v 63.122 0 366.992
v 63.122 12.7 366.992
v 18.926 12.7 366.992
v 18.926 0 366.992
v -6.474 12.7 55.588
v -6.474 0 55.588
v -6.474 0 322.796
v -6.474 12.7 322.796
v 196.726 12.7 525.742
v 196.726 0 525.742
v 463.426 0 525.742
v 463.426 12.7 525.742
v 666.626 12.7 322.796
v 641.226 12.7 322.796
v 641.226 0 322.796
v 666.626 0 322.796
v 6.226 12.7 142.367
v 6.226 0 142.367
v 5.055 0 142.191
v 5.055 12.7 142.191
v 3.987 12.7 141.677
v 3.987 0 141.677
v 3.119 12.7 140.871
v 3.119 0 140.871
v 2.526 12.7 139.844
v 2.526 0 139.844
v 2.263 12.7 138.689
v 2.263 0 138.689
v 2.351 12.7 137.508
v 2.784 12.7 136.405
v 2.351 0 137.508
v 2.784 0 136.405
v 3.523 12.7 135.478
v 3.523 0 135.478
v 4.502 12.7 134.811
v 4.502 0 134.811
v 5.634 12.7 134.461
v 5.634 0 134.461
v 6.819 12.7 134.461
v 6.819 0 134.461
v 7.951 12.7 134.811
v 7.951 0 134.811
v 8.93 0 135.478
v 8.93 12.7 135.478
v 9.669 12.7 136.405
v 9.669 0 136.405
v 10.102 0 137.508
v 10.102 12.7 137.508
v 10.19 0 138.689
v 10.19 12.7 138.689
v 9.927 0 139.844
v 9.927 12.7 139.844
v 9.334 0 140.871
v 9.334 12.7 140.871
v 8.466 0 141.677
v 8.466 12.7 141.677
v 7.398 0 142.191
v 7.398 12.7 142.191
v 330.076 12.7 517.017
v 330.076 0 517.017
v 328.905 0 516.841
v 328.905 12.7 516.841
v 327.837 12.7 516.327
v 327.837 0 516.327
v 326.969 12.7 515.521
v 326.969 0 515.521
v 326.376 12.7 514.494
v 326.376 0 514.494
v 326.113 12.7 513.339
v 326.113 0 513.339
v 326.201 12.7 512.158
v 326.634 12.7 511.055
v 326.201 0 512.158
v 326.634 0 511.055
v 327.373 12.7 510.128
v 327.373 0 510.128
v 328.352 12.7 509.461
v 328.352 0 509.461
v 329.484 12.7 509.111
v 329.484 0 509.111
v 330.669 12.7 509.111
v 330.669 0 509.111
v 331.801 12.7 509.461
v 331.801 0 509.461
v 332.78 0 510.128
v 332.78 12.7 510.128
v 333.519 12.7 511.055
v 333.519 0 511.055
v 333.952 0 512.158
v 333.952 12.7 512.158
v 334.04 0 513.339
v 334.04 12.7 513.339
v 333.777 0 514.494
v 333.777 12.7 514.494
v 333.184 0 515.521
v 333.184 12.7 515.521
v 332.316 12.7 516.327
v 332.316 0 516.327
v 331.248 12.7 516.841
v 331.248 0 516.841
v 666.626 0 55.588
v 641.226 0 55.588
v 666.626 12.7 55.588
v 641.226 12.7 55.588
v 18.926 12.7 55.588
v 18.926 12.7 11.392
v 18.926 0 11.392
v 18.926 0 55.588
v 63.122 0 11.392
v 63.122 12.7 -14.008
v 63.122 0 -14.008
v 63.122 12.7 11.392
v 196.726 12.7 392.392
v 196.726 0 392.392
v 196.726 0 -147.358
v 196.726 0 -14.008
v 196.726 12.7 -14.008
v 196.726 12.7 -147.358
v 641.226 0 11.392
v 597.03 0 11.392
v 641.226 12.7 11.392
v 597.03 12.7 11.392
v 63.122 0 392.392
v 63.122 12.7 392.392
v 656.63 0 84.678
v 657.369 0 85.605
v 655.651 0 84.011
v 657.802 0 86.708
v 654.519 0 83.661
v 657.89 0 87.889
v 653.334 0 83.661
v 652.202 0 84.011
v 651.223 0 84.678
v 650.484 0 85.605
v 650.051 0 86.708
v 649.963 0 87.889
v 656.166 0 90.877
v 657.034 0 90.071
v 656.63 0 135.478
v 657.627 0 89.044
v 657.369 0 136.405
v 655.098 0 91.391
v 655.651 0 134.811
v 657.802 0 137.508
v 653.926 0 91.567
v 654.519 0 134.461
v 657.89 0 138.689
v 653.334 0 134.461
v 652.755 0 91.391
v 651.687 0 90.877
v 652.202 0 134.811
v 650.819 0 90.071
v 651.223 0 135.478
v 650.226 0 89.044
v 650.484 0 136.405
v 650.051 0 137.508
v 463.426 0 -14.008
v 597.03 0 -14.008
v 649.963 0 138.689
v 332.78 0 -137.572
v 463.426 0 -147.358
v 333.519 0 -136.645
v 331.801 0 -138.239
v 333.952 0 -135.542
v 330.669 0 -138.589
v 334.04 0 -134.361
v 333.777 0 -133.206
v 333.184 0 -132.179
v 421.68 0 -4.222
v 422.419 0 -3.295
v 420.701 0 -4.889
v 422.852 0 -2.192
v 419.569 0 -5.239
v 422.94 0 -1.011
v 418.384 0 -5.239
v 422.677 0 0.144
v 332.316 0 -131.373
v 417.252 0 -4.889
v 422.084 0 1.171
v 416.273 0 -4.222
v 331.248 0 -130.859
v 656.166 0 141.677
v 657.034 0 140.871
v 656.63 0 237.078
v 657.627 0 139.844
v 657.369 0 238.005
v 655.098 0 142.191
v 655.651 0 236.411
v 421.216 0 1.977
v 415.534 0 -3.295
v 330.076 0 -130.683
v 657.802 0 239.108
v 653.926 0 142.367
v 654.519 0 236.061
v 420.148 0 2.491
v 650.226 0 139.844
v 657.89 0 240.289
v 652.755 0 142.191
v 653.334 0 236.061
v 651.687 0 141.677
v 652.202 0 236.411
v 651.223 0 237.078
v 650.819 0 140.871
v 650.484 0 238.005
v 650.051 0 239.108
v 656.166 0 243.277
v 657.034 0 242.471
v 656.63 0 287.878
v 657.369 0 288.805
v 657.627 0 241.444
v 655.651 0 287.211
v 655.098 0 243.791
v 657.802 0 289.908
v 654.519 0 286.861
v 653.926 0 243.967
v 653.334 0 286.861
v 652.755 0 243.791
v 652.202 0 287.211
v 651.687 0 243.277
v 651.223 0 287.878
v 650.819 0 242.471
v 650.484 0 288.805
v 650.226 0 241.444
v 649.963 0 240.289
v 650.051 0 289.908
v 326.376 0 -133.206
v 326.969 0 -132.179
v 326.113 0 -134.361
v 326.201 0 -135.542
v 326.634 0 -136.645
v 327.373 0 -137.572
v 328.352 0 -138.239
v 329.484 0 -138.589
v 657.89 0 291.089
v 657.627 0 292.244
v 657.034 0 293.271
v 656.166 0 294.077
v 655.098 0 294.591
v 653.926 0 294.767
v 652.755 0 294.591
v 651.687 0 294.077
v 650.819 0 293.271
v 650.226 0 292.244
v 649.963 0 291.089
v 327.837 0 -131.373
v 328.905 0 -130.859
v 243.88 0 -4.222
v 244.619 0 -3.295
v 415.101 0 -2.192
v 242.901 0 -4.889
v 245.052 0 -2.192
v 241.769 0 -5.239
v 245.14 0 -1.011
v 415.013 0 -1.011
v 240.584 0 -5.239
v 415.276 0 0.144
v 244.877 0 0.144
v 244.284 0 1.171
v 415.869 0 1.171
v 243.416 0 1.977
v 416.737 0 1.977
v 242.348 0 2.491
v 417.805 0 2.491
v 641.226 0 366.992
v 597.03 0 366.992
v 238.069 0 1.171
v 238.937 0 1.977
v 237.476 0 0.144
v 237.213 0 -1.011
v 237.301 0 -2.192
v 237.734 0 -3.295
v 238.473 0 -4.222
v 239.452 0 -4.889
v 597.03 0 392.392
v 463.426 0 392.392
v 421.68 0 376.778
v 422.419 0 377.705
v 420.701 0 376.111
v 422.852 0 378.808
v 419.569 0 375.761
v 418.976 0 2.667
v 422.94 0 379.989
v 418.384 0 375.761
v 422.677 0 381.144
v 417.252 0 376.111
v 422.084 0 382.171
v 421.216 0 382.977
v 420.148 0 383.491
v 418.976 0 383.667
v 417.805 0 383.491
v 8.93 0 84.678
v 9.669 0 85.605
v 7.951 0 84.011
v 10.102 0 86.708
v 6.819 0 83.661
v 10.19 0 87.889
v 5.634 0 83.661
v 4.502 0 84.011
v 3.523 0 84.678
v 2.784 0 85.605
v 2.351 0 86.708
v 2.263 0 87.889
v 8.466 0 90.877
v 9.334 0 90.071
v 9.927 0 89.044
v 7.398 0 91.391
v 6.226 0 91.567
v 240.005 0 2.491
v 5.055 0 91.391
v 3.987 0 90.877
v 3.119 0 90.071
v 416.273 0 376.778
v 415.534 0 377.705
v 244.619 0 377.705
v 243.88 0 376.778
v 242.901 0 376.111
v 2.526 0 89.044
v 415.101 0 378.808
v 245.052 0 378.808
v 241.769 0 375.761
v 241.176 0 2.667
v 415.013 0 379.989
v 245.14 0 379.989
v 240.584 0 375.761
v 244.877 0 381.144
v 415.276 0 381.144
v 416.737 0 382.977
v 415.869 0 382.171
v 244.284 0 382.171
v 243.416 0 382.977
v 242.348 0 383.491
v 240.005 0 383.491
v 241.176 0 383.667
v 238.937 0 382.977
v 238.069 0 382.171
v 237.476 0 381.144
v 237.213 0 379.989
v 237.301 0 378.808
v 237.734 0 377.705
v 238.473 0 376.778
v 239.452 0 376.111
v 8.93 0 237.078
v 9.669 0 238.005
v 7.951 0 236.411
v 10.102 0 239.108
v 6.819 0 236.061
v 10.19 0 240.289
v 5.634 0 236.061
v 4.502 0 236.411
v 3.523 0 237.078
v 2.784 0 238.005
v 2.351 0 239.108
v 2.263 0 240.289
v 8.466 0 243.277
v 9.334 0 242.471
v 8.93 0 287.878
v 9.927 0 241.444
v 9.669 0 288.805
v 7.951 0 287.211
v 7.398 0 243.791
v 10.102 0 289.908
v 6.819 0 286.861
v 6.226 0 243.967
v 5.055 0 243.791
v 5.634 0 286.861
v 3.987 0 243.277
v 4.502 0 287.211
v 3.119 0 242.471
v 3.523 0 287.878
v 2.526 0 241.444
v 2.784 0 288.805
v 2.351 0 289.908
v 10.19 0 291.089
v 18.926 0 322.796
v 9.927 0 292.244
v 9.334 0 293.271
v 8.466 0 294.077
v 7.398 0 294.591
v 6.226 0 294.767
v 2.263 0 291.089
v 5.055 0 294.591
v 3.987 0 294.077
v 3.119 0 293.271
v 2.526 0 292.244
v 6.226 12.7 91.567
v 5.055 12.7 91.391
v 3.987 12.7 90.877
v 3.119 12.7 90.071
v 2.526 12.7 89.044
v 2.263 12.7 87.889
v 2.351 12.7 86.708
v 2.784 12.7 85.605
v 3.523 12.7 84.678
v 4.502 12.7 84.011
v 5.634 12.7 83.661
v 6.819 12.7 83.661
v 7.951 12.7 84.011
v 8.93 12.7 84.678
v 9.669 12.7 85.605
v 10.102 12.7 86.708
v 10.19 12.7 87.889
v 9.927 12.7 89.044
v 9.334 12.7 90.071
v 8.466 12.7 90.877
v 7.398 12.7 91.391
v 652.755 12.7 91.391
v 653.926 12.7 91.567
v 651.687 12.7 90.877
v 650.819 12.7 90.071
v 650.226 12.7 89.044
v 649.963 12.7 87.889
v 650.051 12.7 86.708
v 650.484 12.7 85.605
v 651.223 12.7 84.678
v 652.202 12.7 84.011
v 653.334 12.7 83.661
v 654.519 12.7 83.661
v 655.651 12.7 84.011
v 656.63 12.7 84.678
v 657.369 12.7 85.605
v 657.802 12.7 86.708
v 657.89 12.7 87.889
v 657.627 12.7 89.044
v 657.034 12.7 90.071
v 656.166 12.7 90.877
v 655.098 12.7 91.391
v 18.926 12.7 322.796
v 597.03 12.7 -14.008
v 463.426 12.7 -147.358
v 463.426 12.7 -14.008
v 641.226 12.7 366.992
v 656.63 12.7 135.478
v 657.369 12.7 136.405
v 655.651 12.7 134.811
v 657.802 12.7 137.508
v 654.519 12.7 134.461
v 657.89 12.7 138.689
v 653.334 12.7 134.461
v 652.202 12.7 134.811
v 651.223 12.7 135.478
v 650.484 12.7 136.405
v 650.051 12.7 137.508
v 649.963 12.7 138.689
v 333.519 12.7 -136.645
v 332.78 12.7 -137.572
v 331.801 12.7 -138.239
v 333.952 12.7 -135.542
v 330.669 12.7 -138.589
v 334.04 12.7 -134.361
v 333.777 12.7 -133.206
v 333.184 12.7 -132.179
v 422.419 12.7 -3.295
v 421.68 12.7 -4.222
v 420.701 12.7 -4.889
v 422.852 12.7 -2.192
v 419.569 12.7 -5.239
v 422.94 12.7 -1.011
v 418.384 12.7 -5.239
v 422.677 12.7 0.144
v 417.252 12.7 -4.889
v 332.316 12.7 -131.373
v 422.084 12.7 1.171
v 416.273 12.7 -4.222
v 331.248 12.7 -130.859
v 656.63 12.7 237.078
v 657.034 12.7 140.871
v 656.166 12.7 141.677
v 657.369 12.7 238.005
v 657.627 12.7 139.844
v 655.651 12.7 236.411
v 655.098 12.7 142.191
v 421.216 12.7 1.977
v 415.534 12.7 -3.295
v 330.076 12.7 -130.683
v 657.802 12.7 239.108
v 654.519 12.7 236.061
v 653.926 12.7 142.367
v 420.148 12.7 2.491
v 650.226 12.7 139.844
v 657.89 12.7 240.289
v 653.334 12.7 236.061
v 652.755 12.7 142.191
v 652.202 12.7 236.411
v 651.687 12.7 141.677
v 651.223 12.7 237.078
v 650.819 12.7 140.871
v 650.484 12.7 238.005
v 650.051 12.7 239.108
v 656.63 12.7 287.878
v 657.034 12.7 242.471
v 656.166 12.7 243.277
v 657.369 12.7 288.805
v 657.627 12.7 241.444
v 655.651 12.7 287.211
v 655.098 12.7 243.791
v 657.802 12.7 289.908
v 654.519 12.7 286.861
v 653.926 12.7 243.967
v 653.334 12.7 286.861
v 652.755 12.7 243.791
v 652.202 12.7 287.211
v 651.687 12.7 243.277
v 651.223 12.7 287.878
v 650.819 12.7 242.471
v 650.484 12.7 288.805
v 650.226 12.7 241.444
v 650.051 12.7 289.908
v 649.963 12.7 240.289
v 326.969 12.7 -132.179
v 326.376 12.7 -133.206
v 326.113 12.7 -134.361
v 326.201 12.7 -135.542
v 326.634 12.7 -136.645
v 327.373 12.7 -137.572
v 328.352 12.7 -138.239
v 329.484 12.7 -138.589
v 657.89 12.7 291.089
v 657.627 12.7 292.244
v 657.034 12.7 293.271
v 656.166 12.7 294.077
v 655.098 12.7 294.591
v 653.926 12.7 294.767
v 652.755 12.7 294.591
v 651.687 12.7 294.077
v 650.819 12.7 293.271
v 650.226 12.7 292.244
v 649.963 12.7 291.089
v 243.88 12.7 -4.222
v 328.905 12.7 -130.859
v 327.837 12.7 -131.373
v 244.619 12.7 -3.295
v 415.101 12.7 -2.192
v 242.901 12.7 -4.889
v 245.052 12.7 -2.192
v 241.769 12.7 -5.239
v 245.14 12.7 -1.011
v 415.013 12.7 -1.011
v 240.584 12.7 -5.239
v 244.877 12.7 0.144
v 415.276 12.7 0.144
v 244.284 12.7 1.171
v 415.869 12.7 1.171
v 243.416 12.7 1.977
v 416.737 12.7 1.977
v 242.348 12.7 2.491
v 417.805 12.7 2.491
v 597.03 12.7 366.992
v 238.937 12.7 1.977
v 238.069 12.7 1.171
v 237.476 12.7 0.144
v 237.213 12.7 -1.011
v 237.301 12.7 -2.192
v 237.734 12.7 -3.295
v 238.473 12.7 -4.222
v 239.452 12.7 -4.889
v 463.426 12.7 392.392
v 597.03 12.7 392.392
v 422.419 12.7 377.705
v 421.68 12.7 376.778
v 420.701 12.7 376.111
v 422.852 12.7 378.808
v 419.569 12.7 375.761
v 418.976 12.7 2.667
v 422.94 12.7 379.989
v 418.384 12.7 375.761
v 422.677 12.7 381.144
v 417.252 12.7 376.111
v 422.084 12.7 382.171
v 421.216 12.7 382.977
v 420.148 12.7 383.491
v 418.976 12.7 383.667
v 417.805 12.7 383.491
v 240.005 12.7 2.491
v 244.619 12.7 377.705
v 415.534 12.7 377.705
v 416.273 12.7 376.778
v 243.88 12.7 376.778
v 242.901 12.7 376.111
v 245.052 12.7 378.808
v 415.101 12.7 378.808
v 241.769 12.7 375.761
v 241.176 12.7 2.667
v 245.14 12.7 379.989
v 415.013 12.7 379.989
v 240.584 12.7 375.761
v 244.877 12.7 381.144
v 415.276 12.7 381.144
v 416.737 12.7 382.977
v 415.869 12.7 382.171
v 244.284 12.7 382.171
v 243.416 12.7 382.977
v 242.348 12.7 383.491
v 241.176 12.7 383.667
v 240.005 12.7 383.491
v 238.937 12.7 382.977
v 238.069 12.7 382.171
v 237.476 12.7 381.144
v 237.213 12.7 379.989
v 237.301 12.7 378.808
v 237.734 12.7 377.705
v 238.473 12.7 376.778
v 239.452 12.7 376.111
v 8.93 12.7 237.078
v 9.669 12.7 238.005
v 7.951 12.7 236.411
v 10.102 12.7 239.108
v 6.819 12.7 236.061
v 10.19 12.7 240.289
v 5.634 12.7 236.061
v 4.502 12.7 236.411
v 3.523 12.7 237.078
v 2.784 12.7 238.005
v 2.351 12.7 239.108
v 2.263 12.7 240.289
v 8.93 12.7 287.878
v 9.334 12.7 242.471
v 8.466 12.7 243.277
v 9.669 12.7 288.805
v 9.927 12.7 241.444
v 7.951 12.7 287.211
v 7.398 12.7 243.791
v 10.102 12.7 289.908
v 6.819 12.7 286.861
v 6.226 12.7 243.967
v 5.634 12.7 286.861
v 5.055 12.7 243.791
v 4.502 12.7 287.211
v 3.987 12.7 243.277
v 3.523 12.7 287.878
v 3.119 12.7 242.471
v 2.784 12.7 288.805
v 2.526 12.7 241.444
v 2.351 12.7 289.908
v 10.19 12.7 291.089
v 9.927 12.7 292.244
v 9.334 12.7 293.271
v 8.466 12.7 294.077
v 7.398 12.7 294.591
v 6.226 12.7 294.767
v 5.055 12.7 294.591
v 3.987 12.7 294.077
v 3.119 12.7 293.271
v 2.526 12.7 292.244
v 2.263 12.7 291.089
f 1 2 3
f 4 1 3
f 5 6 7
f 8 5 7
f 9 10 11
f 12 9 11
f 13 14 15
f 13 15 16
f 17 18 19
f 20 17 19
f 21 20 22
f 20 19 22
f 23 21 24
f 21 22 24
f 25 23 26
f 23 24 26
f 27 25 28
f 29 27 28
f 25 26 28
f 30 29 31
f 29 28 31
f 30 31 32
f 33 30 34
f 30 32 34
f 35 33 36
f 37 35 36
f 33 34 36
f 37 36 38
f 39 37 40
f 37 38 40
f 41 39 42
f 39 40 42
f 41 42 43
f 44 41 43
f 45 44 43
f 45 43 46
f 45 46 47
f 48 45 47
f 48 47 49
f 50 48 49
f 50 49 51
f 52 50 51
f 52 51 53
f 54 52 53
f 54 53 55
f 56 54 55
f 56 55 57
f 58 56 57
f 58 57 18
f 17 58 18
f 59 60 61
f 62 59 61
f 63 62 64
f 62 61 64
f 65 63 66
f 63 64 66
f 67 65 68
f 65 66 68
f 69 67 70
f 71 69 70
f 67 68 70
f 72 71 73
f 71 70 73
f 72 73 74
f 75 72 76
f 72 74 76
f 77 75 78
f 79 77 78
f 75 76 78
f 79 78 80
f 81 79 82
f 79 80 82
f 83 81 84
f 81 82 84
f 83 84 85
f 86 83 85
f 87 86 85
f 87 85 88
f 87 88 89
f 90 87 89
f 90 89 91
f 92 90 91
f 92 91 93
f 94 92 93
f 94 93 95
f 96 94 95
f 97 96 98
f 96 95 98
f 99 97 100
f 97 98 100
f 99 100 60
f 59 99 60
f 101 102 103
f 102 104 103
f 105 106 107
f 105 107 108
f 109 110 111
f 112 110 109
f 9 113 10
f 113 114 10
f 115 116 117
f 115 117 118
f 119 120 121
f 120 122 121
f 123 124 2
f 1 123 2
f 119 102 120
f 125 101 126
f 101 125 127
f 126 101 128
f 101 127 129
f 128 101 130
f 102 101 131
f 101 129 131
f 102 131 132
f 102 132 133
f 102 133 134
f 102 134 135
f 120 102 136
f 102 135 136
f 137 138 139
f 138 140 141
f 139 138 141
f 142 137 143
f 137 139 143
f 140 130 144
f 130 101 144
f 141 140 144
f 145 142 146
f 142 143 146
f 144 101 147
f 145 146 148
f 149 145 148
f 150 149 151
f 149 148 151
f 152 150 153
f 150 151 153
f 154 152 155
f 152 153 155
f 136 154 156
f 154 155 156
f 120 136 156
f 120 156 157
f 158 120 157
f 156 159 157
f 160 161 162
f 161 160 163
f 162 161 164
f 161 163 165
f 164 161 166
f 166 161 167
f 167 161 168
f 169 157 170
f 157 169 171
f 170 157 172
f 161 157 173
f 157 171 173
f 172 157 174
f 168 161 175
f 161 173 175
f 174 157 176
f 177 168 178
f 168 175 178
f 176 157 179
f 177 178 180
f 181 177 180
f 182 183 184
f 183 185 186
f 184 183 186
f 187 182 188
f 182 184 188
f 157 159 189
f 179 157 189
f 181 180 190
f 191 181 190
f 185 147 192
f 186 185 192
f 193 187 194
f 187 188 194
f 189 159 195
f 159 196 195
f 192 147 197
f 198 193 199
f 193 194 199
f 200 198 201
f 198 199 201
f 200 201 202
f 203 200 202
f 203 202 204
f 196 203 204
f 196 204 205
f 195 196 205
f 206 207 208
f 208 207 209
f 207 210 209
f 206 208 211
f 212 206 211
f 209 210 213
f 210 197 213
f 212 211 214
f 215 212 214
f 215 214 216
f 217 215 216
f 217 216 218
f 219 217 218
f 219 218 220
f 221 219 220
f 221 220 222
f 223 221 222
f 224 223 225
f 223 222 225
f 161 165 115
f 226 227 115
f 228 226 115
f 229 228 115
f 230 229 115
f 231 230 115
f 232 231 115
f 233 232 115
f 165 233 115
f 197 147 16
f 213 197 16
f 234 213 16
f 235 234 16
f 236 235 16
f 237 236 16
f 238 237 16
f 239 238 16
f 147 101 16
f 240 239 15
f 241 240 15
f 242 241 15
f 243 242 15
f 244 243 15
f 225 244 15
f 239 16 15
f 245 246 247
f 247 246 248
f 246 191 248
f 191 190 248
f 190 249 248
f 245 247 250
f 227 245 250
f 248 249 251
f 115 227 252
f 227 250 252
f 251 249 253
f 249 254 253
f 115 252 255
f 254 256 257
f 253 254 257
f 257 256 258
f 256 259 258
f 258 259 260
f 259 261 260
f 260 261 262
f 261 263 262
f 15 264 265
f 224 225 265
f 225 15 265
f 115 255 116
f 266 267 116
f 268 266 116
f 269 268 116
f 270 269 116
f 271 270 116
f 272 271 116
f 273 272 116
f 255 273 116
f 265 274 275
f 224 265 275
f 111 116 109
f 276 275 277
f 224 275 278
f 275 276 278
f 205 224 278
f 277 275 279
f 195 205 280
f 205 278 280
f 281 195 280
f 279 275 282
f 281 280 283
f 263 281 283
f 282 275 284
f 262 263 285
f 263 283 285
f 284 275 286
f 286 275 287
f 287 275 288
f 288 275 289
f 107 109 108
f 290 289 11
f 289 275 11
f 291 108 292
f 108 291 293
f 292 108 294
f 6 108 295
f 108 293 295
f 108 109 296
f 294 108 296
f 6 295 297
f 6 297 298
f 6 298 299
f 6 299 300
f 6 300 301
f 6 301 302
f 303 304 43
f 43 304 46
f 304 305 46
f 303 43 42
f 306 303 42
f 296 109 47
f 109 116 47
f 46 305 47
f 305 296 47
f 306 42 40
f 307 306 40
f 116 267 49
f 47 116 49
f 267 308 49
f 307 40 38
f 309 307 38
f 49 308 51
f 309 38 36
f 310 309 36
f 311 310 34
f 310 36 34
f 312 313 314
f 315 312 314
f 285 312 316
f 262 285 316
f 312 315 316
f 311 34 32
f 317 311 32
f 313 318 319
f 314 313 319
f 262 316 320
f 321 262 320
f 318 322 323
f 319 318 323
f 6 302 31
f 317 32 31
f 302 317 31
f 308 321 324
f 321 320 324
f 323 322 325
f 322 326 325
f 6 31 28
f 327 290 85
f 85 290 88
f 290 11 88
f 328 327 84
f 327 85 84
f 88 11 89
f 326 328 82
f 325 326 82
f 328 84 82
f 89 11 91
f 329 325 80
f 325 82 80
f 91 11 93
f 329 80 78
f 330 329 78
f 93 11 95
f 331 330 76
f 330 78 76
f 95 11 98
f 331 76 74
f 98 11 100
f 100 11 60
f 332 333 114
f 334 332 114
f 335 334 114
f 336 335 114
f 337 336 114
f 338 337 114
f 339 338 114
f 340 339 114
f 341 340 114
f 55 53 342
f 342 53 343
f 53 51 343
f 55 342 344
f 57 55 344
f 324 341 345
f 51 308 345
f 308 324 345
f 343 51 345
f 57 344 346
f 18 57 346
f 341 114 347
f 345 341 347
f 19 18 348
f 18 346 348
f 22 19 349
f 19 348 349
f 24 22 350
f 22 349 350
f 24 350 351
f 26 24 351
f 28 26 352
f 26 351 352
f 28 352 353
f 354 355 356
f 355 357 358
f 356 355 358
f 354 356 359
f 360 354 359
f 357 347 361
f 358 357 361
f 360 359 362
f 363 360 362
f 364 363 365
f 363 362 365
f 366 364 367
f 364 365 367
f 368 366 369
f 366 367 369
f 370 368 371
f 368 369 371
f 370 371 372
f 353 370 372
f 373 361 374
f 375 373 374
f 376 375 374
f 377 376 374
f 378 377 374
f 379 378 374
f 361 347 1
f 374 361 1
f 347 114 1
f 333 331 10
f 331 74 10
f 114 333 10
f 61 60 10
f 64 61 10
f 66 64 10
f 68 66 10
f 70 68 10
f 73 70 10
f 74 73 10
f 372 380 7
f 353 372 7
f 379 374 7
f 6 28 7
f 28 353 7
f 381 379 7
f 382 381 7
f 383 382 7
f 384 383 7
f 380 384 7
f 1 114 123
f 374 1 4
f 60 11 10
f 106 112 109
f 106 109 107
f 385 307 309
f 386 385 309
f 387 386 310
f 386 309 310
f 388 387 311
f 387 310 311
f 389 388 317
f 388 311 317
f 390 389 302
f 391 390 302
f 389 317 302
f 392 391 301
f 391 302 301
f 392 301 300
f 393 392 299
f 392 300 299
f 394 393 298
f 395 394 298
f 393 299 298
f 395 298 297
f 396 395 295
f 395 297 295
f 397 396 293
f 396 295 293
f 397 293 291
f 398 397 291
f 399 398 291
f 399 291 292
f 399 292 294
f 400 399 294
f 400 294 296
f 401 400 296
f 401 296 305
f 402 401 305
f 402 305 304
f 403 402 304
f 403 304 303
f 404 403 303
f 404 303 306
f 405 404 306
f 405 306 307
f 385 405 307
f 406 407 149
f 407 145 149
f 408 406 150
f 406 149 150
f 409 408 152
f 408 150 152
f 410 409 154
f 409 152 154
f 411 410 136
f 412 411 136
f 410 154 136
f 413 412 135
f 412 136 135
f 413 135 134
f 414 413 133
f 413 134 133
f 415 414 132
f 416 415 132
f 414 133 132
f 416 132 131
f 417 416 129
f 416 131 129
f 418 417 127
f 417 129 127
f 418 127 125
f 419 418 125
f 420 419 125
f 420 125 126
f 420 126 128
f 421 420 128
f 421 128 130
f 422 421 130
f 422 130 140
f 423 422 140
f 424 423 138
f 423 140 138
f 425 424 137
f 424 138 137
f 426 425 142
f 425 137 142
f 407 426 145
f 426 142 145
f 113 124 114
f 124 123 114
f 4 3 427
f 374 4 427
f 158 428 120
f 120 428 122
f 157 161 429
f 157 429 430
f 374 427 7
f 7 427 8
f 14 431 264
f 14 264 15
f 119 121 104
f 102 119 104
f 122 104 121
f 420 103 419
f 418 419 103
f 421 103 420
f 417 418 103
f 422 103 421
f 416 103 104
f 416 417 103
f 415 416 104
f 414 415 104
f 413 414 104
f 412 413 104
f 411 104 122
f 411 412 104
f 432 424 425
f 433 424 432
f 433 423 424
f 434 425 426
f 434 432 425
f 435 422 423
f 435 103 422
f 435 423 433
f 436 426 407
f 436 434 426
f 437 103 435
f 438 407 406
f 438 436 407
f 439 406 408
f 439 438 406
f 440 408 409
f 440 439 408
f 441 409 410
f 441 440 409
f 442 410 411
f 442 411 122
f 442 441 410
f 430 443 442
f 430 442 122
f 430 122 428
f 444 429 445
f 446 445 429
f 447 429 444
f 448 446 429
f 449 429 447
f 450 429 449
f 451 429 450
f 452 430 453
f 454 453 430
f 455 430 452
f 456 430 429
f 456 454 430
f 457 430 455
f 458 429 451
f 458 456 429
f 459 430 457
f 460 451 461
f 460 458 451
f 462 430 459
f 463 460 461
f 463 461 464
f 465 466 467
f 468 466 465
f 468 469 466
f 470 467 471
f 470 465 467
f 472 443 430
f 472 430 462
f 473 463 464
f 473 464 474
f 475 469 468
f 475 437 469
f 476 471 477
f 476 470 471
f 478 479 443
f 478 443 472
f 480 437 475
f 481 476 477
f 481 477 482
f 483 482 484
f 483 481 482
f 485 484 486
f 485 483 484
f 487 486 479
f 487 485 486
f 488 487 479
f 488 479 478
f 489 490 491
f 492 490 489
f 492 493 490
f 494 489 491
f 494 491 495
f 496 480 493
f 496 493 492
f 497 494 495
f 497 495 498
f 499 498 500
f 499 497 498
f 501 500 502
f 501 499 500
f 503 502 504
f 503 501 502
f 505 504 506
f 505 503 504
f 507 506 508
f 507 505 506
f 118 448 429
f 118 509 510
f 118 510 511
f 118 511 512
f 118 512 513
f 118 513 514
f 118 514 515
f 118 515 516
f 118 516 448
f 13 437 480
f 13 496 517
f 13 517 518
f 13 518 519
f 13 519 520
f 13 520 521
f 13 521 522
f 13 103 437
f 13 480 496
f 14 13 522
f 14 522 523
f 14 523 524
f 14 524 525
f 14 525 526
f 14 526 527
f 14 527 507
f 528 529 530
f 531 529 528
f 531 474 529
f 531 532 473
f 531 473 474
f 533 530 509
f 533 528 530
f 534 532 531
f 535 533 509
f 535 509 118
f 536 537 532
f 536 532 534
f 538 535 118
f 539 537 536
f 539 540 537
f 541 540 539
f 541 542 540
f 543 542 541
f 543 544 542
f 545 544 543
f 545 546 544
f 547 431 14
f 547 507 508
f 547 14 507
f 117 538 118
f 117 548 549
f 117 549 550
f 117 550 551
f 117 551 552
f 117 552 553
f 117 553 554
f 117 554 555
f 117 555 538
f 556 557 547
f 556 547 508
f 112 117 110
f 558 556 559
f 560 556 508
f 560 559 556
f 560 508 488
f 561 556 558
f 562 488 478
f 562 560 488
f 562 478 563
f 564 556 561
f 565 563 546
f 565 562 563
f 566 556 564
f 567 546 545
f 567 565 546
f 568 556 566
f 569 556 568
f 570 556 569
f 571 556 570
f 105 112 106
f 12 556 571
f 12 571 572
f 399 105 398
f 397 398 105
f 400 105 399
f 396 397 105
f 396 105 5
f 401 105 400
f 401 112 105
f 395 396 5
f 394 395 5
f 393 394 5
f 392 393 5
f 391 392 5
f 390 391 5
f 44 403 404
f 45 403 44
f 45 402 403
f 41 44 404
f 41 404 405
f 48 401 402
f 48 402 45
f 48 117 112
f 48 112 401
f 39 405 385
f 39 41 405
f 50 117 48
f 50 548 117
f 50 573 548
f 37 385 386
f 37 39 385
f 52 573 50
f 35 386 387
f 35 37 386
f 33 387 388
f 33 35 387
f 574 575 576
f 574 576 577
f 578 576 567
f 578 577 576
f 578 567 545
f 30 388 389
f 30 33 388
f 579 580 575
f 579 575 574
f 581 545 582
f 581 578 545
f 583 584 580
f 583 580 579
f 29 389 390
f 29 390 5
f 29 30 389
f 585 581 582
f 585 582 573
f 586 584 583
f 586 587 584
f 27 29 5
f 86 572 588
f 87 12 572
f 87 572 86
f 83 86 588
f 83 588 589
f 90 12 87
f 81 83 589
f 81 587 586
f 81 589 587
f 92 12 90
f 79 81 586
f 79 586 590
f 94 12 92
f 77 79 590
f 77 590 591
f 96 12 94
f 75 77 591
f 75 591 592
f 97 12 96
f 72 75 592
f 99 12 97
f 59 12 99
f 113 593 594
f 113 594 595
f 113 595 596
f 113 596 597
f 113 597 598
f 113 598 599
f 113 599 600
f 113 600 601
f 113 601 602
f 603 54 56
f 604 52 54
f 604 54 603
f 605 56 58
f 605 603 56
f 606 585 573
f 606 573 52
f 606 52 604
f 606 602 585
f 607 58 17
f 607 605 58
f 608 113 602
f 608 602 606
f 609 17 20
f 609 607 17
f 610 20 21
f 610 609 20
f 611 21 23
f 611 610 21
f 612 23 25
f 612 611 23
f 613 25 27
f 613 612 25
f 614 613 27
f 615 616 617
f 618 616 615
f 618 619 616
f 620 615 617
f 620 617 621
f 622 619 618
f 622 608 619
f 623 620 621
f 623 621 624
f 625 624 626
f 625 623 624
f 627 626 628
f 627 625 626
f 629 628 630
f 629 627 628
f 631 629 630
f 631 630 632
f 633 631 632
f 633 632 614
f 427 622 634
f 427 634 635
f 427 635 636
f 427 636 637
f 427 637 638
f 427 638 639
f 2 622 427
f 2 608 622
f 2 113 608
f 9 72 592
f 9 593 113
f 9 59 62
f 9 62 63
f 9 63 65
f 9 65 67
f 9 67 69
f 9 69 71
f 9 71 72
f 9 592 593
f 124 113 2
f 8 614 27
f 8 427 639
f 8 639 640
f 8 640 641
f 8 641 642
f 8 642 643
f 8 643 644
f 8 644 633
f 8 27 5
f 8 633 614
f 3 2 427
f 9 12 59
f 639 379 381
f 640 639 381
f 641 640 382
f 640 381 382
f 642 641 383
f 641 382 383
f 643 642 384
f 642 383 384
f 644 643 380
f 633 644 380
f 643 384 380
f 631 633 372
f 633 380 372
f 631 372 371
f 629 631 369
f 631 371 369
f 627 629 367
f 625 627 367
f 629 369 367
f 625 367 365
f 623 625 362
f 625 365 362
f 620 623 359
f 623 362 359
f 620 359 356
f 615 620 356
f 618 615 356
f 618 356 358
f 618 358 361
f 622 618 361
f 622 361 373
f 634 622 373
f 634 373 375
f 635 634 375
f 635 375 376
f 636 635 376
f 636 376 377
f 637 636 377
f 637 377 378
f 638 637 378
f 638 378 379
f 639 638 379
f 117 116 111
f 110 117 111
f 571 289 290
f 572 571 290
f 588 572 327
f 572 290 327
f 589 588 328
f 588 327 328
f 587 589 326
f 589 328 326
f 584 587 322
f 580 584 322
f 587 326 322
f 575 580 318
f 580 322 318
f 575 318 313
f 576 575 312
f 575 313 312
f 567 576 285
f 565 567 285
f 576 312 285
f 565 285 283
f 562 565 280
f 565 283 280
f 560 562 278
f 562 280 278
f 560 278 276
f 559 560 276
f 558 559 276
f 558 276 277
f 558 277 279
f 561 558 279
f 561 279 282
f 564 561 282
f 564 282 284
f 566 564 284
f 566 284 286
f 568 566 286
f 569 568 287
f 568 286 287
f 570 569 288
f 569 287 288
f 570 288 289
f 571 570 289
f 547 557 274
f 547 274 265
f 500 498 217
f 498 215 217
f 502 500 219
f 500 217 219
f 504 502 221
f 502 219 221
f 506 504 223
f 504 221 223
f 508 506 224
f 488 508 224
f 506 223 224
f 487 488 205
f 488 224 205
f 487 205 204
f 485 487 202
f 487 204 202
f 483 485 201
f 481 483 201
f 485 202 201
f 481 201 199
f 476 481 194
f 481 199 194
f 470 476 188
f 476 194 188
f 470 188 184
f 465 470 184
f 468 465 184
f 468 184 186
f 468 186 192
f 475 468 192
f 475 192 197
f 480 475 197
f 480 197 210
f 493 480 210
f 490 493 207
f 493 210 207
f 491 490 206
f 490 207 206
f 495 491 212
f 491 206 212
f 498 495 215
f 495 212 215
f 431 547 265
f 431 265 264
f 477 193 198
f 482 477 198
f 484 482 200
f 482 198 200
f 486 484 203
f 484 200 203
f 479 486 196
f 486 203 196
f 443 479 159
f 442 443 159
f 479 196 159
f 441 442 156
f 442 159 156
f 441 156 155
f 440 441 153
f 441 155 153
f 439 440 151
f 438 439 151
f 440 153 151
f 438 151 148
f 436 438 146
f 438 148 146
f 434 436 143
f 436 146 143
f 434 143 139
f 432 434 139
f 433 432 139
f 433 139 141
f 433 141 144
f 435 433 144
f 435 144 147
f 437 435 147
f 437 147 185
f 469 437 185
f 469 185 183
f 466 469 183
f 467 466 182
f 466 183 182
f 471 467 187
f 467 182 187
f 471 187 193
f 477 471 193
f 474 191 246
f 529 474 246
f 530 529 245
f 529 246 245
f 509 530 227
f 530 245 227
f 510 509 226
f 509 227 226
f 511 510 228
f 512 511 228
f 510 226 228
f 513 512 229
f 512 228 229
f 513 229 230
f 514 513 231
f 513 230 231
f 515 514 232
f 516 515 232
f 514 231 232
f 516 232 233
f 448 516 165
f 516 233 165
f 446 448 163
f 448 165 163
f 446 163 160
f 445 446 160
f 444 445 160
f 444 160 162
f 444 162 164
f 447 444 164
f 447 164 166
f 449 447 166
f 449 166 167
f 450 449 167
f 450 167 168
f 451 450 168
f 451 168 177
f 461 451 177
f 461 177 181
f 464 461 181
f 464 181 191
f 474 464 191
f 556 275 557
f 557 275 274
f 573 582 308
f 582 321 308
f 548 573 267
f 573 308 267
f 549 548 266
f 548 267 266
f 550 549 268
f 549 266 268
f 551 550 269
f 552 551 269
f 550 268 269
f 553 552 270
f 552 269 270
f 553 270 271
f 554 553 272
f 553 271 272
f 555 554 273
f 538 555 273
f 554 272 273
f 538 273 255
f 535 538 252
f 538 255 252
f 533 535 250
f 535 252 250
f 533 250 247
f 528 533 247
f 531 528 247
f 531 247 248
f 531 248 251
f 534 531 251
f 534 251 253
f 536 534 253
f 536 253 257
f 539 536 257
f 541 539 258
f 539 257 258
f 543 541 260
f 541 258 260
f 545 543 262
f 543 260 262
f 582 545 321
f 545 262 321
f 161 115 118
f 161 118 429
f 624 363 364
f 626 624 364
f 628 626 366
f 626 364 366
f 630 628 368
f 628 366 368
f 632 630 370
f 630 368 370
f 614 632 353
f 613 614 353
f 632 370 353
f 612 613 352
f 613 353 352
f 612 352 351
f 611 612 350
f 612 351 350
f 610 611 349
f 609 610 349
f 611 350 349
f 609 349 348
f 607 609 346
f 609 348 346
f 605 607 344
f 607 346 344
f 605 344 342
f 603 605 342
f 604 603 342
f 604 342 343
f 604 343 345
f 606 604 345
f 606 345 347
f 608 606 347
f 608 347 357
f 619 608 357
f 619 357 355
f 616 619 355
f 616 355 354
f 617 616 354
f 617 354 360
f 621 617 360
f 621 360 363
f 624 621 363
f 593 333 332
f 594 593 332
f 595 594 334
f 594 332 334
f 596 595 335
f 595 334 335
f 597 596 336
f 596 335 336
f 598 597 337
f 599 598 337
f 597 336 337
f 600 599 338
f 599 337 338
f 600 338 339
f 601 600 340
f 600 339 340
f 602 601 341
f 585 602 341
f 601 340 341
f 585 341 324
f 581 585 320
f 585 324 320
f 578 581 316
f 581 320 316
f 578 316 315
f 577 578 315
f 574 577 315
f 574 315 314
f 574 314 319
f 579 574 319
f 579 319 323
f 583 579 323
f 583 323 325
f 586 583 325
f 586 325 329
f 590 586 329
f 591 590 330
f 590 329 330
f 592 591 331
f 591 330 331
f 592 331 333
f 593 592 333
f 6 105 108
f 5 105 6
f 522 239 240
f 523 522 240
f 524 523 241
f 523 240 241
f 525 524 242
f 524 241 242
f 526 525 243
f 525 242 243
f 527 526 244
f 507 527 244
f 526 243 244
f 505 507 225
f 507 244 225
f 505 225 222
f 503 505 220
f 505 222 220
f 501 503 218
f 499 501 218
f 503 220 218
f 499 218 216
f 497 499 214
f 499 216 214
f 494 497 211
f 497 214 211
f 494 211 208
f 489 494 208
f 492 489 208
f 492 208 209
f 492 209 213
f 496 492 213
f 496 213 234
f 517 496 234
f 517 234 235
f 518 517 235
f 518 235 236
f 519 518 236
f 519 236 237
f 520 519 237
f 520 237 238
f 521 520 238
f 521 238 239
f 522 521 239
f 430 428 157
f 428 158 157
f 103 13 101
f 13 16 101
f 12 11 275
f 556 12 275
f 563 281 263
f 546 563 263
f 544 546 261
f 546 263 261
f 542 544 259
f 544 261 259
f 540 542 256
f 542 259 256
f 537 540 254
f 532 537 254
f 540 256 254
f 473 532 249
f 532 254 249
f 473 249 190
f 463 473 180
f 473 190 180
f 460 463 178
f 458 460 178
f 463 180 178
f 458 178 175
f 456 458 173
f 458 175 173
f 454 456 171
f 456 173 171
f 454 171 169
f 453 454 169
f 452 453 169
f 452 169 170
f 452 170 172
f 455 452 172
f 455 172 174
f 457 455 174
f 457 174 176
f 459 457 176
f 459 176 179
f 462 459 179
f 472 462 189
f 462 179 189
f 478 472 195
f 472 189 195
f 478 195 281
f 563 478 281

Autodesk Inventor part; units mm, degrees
ref_plane "YZ Plane" through (0, 0, 0) normal (1, 0, 0) x (0, 1, 0)
ref_plane "XZ Plane" through (0, 0, 0) normal (0, 1, 0) x (-1, 0, 0)
ref_plane "XY Plane" through (0, 0, 0) normal (0, 0, 1) x (1, 0, 0)
sketch "Sketch1" plane through (0, 0, 0) normal (0, 1, 0) x (-1, 0, 0)
  line L0 (-666.6265, 392.3922) -> (-666.6265, -14.0078)
  line L1 (6.4735, -14.0078) -> (6.4735, 392.3922)
  line L2 (-196.7265, 392.3922) -> (-196.7265, 525.7422)
  line L3 (-196.7265, 525.7422) -> (-463.4265, 525.7422)
  line L4 (-463.4265, 525.7422) -> (-463.4265, 392.3922)
  line L5 (6.4735, 392.3922) -> (-196.7265, 392.3922)
  line L6 (-463.4265, 392.3922) -> (-666.6265, 392.3922)
  line L7 (-196.7265, -14.0078) -> (-196.7265, -147.3578)
  line L8 (-196.7265, -147.3578) -> (-463.4265, -147.3578)
  line L9 (-463.4265, -147.3578) -> (-463.4265, -14.0078)
  line L10 (-666.6265, -14.0078) -> (-463.4265, -14.0078)
  line L11 (-196.7265, -14.0078) -> (6.4735, -14.0078)
  point P0 (0, 0)
  dimension "d0" = 673.1
  dimension "d1" = 406.4
  dimension "d73" = 266.7
  dimension "d75" = 203.2
  dimension "d76" = 266.7
extrude "Extrusion1" add sketch "Sketch1" along normal blind 12.7
sketch "Sketch2" plane through (0, 12.7, 0) normal (0, 1, 0) x (1, 0, 0)
  line L0 (666.6265, -392.3922) -> (666.6265, 14.0078) projected
  line L1 (666.6265, -392.3922) -> (666.6265, -290.7922)
  line L2 (666.6265, -290.7922) -> (666.6265, -189.1922) construction
  line L3 (666.6265, 14.0078) -> (666.6265, -58.7236) construction
  line L4 (666.6265, 14.0078) -> (666.6265, -87.5922) construction
  line L5 (-6.4735, 14.0078) -> (-6.4735, -392.3922) construction
  line L6 (-6.4735, -392.3922) -> (241.1765, -392.3922) construction
  line L7 (-6.4735, -392.3922) -> (666.6265, -392.3922) construction
  line L8 (666.6265, -392.3922) -> (418.9765, -392.3922) construction
  circle A0 centre (653.9265, -290.7922) radius 3.175
  circle A1 centre (653.9265, -87.5922) radius 3.175
  circle A2 centre (241.1765, -379.6922) radius 3.175
  circle A3 centre (418.9765, -379.6922) radius 3.175
  circle A4 centre (418.9765, 1.3078) radius 3.175
  circle A5 centre (241.1765, 1.3078) radius 3.175
  circle A6 centre (6.2265, -87.5922) radius 3.175
  circle A7 centre (6.2265, -290.7922) radius 3.175
  circle A8 centre (6.2265, -239.9922) radius 3.9751
  circle A9 centre (6.2265, -138.3922) radius 3.9751
  circle A10 centre (653.9265, -239.9922) radius 3.9751
  circle A11 centre (653.9265, -138.3922) radius 3.9751
  line L9 (458.3979, 14.0078) -> (460.8865, 14.0078)
  line L10 (460.8865, 14.0078) -> (460.8865, -3.7722)
  line L11 (460.8865, -3.7722) -> (448.1865, -3.7722)
  line L12 (448.1865, -3.7722) -> (448.1865, 7.197)
  line L13 (448.1865, 7.197) -> (460.8865, 7.197)
  line L14 (460.8865, 7.197) -> (460.8865, -3.7722)
  line L15 (666.6265, 14.0078) -> (-6.4735, 14.0078) projected
  circle A12 centre (330.0765, -513.0422) radius 3.9751
  line L16 (196.7265, -392.3922) -> (196.7265, -525.7422) projected
  circle A13 centre (330.0765, 134.6578) radius 3.9751
  line L17 (196.7265, 147.3578) -> (196.7265, 14.0078) projected
  line L18 (196.7265, -525.7422) -> (463.4265, -525.7422) projected
  line L19 (463.4265, 147.3578) -> (196.7265, 147.3578) projected
  point P0 (0, 0)
  dimension "d11" = 6.35
  dimension "d12" = 6.35
  dimension "d13" = 12.7
  dimension "d14" = 12.7
  dimension "d15" = 6.35
  dimension "d16" = 12.7
  dimension "d17" = 6.35
  dimension "d18" = 12.7
  dimension "d19" = 6.35
  dimension "d20" = 6.35
  dimension "d23" = 6.35
  dimension "d24" = 6.35
  dimension "d25" = 12.7
  dimension "d26" = 12.7
  dimension "d34" = 7.9502
  dimension "d35" = 7.9502
  dimension "d40" = 50.8
  dimension "d43" = 50.8
  dimension "d44" = 7.9502
  dimension "d45" = 7.9502
  dimension "d46" = 50.8
  dimension "d66" = 205.74
  dimension "d68" = 12.7
  dimension "d70" = 17.78
  dimension "d78" = 7.9502
  dimension "d79" = 133.35
  dimension "d80" = 7.9502
  dimension "d81" = 133.35
  dimension "d82" = 12.7
  dimension "d83" = 12.7
hole "Hole1" at (653.9265, 12.7, 290.7922) at (653.9265, 12.7, 87.5922) at (418.9765, 12.7, -1.3078) at (241.1765, 12.7, -1.3078) at (418.9765, 12.7, 379.6922) at (241.1765, 12.7, 379.6922) at (6.2265, 12.7, 290.7922) at (6.2265, 12.7, 87.5922) at (6.2265, 12.7, 239.9922) at (6.2265, 12.7, 138.3922) at (653.9265, 12.7, 239.9922) at (653.9265, 12.7, 138.3922) at (330.0765, 12.7, 513.0422) at (330.0765, 12.7, -134.6578) direction (0, -1, 0) diameter 7.9502 end through all
sketch "Sketch3" plane through (0, 12.7, 0) normal (0, 1, 0) x (1, 0, 0)
  line L0 (-6.4735, -392.3922) -> (666.6265, -392.3922) projected
  line L1 (-6.4735, -392.3922) -> (63.1225, -392.3922)
  line L2 (63.1225, -392.3922) -> (63.1225, -366.9922)
  line L3 (63.1225, -366.9922) -> (18.9265, -366.9922)
  line L4 (-6.4735, -366.9922) -> (-6.4735, -392.3922)
  line L5 (-6.4735, -392.3922) -> (18.9265, -392.3922)
  line L6 (18.9265, -366.9922) -> (18.9265, -322.7962)
  line L7 (18.9265, -322.7962) -> (-6.4735, -322.7962)
  line L8 (-6.4735, -322.7962) -> (-6.4735, -392.3922)
  line L9 (666.6265, 14.0078) -> (-6.4735, 14.0078) projected
  line L10 (-6.4735, 14.0078) -> (63.1225, 14.0078)
  line L11 (63.1225, 14.0078) -> (63.1225, -11.3922)
  line L12 (63.1225, -11.3922) -> (18.9265, -11.3922)
  line L13 (-6.4735, -11.3922) -> (-6.4735, 14.0078)
  line L14 (-6.4735, 14.0078) -> (18.9265, 14.0078)
  line L15 (18.9265, -11.3922) -> (18.9265, -55.5882)
  line L16 (18.9265, -55.5882) -> (-6.4735, -55.5882)
  line L17 (-6.4735, -55.5882) -> (-6.4735, 14.0078)
  line L18 (666.6265, -392.3922) -> (641.2265, -392.3922)
  line L19 (641.2265, -366.9922) -> (641.2265, -322.7962)
  line L20 (641.2265, -322.7962) -> (666.6265, -322.7962)
  line L21 (666.6265, -322.7962) -> (666.6265, -392.3922)
  line L22 (666.6265, -392.3922) -> (597.0305, -392.3922)
  line L23 (597.0305, -392.3922) -> (597.0305, -366.9922)
  line L24 (597.0305, -366.9922) -> (641.2265, -366.9922)
  line L25 (666.6265, -366.9922) -> (666.6265, -392.3922)
  line L26 (666.6265, 14.0078) -> (597.0305, 14.0078)
  line L27 (597.0305, 14.0078) -> (597.0305, -11.3922)
  line L28 (597.0305, -11.3922) -> (641.2265, -11.3922)
  line L29 (666.6265, -11.3922) -> (666.6265, 14.0078)
  line L30 (666.6265, 14.0078) -> (641.2265, 14.0078)
  line L31 (641.2265, -11.3922) -> (641.2265, -55.5882)
  line L32 (641.2265, -55.5882) -> (666.6265, -55.5882)
  line L33 (666.6265, -55.5882) -> (666.6265, 14.0078)
  point P0 (0, 0)
  dimension "d47" = 69.596
  dimension "d48" = 25.4
  dimension "d49" = 25.4
  dimension "d50" = 69.596
  dimension "d51" = 69.596
  dimension "d52" = 25.4
  dimension "d53" = 25.4
  dimension "d54" = 69.596
  dimension "d55" = 25.4
  dimension "d56" = 69.596
  dimension "d57" = 69.596
  dimension "d58" = 25.4
  dimension "d59" = 69.596
  dimension "d60" = 25.4
  dimension "d61" = 25.4
  dimension "d62" = 69.596
extrude "Extrusion2" cut sketch "Sketch3" against normal blind 25.4
sketch "Sketch4" plane through (0, 12.7, 0) normal (0, 1, 0) x (1, 0, 0)
  line L0 (-6.4735, -55.5882) -> (-6.4735, -322.7962) construction
  line L1 (666.6265, -322.7962) -> (666.6265, -55.5882) construction
  point P0 (0, 0)
properties part number "Polyc_for_swerve" material "Polycarbonate, Clear"
